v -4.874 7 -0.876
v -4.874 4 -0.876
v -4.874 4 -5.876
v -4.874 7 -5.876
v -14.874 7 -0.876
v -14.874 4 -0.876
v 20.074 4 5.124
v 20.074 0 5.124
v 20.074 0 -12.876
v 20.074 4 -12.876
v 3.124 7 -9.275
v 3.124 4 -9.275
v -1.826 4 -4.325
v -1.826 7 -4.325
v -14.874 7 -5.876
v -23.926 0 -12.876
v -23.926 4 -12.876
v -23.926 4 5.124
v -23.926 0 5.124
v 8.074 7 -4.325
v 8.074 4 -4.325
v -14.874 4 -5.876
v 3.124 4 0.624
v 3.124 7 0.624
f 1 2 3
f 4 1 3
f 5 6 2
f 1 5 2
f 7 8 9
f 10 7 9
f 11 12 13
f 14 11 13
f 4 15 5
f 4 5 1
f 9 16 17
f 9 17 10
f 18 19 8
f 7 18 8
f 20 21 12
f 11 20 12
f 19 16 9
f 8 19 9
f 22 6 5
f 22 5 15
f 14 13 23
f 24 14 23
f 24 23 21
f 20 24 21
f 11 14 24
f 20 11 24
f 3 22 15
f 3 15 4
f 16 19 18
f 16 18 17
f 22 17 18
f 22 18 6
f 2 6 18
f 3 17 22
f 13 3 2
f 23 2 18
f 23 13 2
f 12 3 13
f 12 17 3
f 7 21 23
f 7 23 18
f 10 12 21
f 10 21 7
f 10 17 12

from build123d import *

# Parameters (mm, degrees)
SKETCH1_W           = 44
SKETCH1_H           = 18
BOSS_EXTRUDE1_DEPTH = 4
SKETCH2_W           = 10
SKETCH2_H           = 5
BOSS_EXTRUDE2_DEPTH = 3


with BuildPart() as part:
    # Sketch1 → Boss-Extrude1 (new body)
    with BuildSketch(Plane(origin=(0, 0, 0), x_dir=(1, 0, 0), z_dir=(0, 1, 0))):
        with Locations((-1.926267281, 3.875576037)):
            Rectangle(SKETCH1_W, SKETCH1_H)
    extrude(amount=BOSS_EXTRUDE1_DEPTH)

    # Sketch2 → Boss-Extrude2 (add)
    with BuildSketch(Plane(origin=(0, 4, 0), x_dir=(1, 0, 0), z_dir=(0, 1, 0))):
        with Locations((-9.873666519, 3.375576037)):
            Rectangle(SKETCH2_W, SKETCH2_H)
        Polygon((-1.825762218, 4.325323505), (3.123985251, -0.624423963), (8.073732719, 4.325323505), (3.123985251, 9.275070973), align=None)
    extrude(amount=BOSS_EXTRUDE2_DEPTH)


solid = part.part
